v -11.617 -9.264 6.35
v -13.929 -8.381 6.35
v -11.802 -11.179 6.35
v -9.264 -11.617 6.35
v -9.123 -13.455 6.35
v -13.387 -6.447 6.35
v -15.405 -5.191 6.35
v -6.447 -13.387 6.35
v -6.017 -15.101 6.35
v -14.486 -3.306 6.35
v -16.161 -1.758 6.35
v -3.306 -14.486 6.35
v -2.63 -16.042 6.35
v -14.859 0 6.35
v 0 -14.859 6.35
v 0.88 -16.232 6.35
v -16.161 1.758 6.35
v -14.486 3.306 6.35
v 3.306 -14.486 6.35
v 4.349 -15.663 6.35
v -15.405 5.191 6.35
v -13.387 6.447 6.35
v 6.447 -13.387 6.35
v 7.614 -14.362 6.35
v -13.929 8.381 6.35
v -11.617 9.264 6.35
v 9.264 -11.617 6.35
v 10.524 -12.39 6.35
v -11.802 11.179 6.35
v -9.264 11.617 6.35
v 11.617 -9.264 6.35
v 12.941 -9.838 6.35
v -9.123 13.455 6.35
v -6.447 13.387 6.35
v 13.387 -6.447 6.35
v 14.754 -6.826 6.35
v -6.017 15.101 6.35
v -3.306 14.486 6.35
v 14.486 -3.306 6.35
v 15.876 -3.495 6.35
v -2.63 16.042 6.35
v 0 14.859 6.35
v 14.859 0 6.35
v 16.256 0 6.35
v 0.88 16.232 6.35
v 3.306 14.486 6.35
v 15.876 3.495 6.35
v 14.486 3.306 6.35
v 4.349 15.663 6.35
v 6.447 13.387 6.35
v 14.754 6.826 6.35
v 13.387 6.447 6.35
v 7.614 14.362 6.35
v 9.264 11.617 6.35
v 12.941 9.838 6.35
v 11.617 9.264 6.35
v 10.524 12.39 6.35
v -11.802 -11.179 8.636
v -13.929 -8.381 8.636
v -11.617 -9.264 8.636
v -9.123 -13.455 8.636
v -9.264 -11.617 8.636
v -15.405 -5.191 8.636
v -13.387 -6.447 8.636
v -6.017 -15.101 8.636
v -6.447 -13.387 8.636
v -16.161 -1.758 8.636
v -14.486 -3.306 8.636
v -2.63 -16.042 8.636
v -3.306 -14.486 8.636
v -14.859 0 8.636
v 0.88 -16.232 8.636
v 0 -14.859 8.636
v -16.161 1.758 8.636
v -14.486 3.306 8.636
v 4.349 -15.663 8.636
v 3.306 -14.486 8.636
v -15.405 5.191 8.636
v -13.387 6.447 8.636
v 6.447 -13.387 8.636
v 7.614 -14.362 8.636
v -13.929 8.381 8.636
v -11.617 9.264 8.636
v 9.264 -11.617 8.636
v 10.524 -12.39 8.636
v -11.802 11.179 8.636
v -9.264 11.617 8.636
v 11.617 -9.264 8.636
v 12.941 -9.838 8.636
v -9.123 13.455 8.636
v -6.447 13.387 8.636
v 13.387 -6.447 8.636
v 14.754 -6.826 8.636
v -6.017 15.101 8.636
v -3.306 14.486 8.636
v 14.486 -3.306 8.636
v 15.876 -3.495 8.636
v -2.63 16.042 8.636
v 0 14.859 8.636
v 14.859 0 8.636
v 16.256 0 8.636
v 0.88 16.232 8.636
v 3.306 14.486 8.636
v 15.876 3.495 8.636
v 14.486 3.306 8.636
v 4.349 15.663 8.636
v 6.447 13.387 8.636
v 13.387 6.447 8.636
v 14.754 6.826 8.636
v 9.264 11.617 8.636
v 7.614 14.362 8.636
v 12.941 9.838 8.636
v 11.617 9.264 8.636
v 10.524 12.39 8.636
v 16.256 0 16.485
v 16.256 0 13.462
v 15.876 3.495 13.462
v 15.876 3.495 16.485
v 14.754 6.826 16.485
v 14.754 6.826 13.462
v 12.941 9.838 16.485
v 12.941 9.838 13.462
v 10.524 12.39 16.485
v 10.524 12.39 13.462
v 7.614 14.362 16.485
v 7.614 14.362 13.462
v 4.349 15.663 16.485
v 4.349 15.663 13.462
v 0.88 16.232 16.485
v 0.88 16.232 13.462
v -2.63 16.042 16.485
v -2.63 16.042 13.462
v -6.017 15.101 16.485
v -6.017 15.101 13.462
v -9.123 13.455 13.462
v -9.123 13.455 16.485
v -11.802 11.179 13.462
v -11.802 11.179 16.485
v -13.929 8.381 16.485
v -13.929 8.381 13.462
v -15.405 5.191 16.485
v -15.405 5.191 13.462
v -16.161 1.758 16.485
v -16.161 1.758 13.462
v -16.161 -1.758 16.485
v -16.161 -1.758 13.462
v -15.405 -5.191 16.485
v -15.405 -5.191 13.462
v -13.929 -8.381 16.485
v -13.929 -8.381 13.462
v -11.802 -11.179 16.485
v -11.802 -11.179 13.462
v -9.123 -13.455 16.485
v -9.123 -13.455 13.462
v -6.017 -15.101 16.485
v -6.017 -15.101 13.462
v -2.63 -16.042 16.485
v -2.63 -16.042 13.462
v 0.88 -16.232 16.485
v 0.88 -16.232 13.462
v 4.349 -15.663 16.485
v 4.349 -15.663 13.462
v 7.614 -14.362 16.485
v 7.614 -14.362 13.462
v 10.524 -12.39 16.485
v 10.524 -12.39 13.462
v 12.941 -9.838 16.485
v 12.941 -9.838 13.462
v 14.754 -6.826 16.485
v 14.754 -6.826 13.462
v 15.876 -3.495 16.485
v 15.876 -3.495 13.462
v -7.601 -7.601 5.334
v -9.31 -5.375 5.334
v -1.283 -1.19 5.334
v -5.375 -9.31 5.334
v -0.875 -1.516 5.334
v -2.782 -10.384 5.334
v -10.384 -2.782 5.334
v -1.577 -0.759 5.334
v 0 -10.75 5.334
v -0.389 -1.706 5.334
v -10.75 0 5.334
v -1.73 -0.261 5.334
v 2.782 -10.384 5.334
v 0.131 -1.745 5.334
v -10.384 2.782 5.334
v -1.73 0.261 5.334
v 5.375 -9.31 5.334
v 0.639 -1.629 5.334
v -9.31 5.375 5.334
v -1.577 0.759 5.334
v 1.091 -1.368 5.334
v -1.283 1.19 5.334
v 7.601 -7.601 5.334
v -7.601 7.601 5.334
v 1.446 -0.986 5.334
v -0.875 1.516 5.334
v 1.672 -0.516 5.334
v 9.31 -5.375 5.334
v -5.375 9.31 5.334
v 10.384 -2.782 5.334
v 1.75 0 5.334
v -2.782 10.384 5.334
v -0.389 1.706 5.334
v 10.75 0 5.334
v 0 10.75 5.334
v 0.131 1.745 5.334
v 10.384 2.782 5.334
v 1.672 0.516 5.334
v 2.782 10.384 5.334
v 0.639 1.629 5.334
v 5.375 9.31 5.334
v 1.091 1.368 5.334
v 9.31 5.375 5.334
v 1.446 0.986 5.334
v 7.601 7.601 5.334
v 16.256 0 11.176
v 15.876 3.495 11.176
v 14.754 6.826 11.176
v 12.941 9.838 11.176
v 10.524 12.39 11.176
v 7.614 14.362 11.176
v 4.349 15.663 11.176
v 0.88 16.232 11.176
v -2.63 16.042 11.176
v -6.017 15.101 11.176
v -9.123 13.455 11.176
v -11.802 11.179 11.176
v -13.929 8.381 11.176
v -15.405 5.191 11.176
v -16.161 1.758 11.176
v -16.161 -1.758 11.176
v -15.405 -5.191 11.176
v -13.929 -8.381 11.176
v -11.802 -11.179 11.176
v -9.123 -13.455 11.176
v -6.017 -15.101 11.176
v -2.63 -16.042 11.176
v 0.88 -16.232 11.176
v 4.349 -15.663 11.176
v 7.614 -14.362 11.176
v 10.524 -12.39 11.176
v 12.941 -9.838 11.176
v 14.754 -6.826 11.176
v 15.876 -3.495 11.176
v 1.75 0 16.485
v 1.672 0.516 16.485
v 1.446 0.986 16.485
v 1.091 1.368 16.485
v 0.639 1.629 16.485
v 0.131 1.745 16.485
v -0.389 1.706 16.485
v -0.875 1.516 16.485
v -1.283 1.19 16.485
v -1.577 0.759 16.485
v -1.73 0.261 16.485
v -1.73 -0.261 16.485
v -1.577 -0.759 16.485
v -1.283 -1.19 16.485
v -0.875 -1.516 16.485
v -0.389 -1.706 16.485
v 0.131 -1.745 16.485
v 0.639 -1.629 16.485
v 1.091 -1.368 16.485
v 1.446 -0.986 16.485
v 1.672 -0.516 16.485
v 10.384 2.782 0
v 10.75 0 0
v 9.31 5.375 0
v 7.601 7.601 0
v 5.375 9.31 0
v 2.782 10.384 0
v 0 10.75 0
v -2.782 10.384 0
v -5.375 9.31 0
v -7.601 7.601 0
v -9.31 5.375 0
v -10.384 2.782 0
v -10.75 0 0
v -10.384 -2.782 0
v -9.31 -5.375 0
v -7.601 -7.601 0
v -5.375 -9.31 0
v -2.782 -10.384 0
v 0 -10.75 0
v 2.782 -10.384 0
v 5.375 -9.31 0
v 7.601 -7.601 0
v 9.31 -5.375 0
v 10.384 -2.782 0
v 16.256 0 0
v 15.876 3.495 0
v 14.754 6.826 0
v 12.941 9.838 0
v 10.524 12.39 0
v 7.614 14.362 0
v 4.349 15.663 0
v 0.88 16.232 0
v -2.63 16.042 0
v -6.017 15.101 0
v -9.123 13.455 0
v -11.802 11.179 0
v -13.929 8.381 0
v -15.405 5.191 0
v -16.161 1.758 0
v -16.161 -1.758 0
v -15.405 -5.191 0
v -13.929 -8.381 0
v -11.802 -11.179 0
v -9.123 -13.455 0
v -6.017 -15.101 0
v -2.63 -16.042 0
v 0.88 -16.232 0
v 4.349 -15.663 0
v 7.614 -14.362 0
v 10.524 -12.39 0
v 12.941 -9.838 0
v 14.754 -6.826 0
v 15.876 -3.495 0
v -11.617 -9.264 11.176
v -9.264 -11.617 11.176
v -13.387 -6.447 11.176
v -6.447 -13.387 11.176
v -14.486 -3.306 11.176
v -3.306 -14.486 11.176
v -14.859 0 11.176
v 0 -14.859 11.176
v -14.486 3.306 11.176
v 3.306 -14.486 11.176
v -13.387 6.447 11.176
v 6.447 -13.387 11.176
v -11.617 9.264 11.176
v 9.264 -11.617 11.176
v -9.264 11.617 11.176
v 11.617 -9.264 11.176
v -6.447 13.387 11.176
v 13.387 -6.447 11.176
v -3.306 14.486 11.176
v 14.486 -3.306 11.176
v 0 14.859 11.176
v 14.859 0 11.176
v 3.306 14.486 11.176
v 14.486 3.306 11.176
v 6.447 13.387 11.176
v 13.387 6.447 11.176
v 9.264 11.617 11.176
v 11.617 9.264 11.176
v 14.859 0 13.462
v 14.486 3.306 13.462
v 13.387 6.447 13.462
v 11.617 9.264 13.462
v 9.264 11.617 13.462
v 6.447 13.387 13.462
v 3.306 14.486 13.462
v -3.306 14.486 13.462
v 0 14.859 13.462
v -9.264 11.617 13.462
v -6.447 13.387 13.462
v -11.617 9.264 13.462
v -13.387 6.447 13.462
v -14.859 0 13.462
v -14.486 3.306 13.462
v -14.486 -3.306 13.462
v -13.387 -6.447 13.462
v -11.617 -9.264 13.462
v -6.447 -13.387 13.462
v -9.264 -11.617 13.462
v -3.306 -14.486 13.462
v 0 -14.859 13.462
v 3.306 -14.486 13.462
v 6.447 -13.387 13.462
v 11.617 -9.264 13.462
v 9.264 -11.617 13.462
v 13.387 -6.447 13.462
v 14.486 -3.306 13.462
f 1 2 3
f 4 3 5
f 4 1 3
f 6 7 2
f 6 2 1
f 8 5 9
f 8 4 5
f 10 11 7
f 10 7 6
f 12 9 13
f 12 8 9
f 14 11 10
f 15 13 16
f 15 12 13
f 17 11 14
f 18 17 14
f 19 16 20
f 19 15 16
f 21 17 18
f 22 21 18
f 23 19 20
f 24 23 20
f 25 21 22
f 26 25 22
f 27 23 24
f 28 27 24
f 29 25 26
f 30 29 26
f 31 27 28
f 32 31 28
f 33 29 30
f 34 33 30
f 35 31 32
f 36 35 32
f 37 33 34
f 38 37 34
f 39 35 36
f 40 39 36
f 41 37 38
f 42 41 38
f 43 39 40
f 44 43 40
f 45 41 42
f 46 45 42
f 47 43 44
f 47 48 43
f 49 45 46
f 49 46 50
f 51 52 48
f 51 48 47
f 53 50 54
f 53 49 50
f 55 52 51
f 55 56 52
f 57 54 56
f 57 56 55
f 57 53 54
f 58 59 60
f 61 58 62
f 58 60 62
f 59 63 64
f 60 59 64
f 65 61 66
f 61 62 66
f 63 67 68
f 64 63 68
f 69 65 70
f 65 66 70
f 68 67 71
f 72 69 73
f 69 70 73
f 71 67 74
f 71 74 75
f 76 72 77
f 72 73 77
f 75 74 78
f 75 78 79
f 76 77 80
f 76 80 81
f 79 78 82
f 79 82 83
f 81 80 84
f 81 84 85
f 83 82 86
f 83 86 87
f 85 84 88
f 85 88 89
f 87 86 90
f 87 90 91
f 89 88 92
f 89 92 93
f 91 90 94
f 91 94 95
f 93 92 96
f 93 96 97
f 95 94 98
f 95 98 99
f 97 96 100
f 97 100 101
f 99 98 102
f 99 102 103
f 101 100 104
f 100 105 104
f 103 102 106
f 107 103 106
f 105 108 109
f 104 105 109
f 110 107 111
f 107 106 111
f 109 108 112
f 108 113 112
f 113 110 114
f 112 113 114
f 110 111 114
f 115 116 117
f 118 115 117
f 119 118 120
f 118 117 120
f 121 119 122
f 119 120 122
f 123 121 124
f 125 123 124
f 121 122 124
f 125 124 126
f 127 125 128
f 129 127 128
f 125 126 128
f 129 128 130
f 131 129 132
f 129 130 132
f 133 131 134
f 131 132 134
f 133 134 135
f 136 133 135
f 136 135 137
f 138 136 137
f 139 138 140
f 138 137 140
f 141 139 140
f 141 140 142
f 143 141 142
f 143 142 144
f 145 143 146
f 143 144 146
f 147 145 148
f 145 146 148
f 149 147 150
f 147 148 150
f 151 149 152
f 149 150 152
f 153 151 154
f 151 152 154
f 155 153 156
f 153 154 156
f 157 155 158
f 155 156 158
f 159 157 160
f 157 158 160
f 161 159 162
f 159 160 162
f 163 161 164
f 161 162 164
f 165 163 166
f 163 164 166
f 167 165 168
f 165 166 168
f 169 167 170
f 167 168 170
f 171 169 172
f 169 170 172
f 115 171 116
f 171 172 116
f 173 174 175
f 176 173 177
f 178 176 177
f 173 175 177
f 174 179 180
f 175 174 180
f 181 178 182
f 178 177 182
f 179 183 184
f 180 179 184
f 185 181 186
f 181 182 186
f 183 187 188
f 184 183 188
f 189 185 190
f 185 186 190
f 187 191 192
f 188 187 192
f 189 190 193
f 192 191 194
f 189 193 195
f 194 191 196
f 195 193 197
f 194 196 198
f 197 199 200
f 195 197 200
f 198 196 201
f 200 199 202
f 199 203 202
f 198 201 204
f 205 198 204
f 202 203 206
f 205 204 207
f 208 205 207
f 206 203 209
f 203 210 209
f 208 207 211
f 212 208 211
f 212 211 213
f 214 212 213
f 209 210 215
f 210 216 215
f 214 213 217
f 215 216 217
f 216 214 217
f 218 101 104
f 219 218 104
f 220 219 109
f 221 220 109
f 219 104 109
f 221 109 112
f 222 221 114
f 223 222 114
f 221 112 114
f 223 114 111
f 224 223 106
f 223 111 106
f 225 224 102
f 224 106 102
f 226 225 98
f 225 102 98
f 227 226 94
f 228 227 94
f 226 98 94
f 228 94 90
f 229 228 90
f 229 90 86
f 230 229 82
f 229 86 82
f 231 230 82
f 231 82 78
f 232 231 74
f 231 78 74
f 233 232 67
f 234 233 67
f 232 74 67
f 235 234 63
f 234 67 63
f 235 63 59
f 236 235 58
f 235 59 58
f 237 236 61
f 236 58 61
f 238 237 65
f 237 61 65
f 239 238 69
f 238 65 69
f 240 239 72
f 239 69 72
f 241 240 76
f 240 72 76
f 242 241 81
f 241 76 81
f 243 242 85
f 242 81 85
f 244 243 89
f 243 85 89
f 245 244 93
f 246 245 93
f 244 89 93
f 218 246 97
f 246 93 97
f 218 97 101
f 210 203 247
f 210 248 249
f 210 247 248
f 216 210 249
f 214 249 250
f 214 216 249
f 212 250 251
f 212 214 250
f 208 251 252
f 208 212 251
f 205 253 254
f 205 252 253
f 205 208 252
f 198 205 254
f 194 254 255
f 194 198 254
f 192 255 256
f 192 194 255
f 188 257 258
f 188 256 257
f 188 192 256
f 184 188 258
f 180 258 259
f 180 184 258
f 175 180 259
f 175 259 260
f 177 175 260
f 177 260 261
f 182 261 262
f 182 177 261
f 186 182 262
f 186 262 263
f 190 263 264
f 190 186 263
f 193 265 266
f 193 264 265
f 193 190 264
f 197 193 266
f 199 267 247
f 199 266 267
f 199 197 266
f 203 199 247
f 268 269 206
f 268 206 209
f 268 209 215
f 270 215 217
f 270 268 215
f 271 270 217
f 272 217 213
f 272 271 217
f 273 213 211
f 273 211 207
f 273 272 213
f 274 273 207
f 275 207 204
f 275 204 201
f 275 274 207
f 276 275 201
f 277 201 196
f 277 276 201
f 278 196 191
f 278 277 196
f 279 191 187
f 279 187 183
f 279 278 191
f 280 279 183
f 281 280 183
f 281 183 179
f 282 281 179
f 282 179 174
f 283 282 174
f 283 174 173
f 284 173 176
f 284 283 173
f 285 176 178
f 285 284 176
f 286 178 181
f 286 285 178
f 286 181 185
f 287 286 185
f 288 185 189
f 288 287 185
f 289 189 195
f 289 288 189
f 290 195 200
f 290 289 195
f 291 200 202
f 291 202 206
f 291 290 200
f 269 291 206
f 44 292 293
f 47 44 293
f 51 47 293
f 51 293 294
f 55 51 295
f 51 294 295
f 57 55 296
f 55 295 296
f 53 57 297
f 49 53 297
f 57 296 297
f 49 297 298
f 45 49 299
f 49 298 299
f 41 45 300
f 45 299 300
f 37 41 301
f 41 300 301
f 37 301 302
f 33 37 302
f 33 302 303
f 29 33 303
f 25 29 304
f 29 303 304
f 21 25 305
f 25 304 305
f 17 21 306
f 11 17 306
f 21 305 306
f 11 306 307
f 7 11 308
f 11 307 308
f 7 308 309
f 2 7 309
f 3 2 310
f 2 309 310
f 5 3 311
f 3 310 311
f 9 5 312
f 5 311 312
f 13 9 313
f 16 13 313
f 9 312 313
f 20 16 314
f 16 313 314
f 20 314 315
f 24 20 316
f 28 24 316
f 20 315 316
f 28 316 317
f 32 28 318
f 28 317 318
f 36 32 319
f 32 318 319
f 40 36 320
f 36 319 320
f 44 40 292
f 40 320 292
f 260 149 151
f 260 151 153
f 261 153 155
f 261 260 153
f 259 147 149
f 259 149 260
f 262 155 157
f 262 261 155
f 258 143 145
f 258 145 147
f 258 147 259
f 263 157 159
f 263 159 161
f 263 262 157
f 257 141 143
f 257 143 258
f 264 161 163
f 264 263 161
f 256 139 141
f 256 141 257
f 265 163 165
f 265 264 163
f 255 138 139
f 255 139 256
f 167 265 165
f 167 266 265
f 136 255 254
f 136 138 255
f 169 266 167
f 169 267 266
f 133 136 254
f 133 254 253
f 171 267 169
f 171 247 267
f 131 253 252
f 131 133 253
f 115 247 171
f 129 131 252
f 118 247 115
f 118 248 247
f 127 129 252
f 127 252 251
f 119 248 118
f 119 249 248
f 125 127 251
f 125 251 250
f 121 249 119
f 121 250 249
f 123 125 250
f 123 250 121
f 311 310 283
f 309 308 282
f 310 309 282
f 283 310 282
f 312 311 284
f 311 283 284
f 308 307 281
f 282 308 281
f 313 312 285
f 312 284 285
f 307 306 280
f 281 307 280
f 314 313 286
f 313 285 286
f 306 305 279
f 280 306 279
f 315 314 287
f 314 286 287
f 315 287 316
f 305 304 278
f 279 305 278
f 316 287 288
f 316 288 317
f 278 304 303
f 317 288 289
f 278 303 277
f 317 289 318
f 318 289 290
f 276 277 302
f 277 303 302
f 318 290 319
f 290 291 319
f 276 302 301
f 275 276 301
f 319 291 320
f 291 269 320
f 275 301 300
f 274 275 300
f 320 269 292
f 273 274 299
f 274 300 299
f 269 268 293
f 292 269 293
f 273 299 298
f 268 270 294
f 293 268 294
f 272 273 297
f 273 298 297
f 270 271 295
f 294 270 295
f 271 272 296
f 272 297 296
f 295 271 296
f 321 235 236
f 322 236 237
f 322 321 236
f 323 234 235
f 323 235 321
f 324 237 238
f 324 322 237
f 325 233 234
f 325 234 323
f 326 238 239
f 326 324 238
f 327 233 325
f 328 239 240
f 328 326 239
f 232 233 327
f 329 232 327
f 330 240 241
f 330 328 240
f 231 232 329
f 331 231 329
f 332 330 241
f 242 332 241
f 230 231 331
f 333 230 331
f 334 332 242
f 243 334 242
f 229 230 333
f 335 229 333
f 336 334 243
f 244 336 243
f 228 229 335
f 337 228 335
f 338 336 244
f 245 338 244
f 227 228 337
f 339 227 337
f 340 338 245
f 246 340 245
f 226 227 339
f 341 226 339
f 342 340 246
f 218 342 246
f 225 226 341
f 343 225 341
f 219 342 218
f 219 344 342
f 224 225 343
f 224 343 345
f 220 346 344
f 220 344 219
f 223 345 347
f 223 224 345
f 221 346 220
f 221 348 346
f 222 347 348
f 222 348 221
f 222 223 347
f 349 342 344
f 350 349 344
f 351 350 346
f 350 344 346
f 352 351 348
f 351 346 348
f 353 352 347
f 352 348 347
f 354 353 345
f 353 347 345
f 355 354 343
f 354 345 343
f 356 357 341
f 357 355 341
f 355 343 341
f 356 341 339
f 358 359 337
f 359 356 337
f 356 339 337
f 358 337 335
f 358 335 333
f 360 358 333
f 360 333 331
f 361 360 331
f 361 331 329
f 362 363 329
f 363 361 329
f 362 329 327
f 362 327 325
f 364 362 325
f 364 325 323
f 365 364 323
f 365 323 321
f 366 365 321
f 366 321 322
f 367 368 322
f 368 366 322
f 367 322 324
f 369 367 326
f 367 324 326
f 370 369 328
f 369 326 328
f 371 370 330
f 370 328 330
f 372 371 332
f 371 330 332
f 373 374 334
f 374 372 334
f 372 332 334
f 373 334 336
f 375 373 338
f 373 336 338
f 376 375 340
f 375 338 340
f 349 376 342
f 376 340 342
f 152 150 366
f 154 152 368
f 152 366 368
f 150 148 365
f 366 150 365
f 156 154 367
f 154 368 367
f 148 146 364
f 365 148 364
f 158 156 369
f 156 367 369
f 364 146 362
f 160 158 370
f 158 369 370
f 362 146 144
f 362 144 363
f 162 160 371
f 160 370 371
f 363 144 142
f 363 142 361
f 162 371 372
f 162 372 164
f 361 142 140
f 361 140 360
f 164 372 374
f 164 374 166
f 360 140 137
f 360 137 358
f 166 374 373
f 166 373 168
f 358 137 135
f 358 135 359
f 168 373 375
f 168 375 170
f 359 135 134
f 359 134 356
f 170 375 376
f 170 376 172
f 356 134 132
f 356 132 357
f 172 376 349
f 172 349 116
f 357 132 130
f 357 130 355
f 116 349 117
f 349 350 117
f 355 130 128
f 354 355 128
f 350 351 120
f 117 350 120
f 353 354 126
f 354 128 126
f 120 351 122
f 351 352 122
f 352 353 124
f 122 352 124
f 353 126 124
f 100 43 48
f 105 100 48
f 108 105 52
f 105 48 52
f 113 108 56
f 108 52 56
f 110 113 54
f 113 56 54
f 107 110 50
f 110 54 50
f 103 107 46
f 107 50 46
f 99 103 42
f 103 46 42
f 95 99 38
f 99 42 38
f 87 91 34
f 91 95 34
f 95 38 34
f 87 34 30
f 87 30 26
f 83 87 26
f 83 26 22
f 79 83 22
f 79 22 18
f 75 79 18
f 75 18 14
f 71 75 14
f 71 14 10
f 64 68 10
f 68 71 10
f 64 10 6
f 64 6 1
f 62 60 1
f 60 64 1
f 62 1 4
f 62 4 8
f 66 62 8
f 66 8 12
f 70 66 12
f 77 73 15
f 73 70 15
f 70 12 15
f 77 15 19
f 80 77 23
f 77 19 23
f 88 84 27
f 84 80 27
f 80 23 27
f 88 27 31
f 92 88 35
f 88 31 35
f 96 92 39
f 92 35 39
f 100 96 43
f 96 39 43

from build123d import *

# Parameters (mm, degrees)
F0_R      = 16.256
F1_DEPTH  = 6.35
F2_R      = 14.859
F3_DEPTH  = 16.002
F5_R      = 16.256
F6_DEPTH  = 2.54
F8_R      = 16.256
F9_DEPTH  = 3.0226
F10_R     = 1.75
F11_DEPTH = 42.672
F12_R     = 1.75
F13_DEPTH = 37.084
F14_R     = 10.75
F15_DEPTH = 5.334


with BuildPart() as f1:
    # F0 (on Top) → F1 (new body)
    with BuildSketch(Plane.XY):
        Circle(F0_R)
    extrude(amount=F1_DEPTH)

    # F2 (on Top) → F3 (join)
    with BuildSketch(Plane.XY):
        Circle(F2_R)
    extrude(amount=F3_DEPTH)

    # F5 (on offset) → F6 (join)
    with BuildSketch(Plane.XY.offset(8.636)):
        Circle(F5_R)
    extrude(amount=F6_DEPTH)

    # F8 (on offset) → F9 (join)
    with BuildSketch(Plane.XY.offset(13.462)):
        Circle(F8_R)
    extrude(amount=F9_DEPTH)

    # F10 (on offset) → F11 (cut)
    with BuildSketch(Plane.XY.offset(13.462)):
        Circle(F10_R)
    extrude(amount=F11_DEPTH, mode=Mode.SUBTRACT)

    # F12 (on Top) → F13 (cut)
    with BuildSketch(Plane.XY):
        Circle(F12_R)
    extrude(amount=F13_DEPTH, mode=Mode.SUBTRACT)

    # F14 (on Top) → F15 (cut)
    with BuildSketch(Plane.XY):
        Circle(F14_R)
    extrude(amount=F15_DEPTH, mode=Mode.SUBTRACT)


solid = f1.part
